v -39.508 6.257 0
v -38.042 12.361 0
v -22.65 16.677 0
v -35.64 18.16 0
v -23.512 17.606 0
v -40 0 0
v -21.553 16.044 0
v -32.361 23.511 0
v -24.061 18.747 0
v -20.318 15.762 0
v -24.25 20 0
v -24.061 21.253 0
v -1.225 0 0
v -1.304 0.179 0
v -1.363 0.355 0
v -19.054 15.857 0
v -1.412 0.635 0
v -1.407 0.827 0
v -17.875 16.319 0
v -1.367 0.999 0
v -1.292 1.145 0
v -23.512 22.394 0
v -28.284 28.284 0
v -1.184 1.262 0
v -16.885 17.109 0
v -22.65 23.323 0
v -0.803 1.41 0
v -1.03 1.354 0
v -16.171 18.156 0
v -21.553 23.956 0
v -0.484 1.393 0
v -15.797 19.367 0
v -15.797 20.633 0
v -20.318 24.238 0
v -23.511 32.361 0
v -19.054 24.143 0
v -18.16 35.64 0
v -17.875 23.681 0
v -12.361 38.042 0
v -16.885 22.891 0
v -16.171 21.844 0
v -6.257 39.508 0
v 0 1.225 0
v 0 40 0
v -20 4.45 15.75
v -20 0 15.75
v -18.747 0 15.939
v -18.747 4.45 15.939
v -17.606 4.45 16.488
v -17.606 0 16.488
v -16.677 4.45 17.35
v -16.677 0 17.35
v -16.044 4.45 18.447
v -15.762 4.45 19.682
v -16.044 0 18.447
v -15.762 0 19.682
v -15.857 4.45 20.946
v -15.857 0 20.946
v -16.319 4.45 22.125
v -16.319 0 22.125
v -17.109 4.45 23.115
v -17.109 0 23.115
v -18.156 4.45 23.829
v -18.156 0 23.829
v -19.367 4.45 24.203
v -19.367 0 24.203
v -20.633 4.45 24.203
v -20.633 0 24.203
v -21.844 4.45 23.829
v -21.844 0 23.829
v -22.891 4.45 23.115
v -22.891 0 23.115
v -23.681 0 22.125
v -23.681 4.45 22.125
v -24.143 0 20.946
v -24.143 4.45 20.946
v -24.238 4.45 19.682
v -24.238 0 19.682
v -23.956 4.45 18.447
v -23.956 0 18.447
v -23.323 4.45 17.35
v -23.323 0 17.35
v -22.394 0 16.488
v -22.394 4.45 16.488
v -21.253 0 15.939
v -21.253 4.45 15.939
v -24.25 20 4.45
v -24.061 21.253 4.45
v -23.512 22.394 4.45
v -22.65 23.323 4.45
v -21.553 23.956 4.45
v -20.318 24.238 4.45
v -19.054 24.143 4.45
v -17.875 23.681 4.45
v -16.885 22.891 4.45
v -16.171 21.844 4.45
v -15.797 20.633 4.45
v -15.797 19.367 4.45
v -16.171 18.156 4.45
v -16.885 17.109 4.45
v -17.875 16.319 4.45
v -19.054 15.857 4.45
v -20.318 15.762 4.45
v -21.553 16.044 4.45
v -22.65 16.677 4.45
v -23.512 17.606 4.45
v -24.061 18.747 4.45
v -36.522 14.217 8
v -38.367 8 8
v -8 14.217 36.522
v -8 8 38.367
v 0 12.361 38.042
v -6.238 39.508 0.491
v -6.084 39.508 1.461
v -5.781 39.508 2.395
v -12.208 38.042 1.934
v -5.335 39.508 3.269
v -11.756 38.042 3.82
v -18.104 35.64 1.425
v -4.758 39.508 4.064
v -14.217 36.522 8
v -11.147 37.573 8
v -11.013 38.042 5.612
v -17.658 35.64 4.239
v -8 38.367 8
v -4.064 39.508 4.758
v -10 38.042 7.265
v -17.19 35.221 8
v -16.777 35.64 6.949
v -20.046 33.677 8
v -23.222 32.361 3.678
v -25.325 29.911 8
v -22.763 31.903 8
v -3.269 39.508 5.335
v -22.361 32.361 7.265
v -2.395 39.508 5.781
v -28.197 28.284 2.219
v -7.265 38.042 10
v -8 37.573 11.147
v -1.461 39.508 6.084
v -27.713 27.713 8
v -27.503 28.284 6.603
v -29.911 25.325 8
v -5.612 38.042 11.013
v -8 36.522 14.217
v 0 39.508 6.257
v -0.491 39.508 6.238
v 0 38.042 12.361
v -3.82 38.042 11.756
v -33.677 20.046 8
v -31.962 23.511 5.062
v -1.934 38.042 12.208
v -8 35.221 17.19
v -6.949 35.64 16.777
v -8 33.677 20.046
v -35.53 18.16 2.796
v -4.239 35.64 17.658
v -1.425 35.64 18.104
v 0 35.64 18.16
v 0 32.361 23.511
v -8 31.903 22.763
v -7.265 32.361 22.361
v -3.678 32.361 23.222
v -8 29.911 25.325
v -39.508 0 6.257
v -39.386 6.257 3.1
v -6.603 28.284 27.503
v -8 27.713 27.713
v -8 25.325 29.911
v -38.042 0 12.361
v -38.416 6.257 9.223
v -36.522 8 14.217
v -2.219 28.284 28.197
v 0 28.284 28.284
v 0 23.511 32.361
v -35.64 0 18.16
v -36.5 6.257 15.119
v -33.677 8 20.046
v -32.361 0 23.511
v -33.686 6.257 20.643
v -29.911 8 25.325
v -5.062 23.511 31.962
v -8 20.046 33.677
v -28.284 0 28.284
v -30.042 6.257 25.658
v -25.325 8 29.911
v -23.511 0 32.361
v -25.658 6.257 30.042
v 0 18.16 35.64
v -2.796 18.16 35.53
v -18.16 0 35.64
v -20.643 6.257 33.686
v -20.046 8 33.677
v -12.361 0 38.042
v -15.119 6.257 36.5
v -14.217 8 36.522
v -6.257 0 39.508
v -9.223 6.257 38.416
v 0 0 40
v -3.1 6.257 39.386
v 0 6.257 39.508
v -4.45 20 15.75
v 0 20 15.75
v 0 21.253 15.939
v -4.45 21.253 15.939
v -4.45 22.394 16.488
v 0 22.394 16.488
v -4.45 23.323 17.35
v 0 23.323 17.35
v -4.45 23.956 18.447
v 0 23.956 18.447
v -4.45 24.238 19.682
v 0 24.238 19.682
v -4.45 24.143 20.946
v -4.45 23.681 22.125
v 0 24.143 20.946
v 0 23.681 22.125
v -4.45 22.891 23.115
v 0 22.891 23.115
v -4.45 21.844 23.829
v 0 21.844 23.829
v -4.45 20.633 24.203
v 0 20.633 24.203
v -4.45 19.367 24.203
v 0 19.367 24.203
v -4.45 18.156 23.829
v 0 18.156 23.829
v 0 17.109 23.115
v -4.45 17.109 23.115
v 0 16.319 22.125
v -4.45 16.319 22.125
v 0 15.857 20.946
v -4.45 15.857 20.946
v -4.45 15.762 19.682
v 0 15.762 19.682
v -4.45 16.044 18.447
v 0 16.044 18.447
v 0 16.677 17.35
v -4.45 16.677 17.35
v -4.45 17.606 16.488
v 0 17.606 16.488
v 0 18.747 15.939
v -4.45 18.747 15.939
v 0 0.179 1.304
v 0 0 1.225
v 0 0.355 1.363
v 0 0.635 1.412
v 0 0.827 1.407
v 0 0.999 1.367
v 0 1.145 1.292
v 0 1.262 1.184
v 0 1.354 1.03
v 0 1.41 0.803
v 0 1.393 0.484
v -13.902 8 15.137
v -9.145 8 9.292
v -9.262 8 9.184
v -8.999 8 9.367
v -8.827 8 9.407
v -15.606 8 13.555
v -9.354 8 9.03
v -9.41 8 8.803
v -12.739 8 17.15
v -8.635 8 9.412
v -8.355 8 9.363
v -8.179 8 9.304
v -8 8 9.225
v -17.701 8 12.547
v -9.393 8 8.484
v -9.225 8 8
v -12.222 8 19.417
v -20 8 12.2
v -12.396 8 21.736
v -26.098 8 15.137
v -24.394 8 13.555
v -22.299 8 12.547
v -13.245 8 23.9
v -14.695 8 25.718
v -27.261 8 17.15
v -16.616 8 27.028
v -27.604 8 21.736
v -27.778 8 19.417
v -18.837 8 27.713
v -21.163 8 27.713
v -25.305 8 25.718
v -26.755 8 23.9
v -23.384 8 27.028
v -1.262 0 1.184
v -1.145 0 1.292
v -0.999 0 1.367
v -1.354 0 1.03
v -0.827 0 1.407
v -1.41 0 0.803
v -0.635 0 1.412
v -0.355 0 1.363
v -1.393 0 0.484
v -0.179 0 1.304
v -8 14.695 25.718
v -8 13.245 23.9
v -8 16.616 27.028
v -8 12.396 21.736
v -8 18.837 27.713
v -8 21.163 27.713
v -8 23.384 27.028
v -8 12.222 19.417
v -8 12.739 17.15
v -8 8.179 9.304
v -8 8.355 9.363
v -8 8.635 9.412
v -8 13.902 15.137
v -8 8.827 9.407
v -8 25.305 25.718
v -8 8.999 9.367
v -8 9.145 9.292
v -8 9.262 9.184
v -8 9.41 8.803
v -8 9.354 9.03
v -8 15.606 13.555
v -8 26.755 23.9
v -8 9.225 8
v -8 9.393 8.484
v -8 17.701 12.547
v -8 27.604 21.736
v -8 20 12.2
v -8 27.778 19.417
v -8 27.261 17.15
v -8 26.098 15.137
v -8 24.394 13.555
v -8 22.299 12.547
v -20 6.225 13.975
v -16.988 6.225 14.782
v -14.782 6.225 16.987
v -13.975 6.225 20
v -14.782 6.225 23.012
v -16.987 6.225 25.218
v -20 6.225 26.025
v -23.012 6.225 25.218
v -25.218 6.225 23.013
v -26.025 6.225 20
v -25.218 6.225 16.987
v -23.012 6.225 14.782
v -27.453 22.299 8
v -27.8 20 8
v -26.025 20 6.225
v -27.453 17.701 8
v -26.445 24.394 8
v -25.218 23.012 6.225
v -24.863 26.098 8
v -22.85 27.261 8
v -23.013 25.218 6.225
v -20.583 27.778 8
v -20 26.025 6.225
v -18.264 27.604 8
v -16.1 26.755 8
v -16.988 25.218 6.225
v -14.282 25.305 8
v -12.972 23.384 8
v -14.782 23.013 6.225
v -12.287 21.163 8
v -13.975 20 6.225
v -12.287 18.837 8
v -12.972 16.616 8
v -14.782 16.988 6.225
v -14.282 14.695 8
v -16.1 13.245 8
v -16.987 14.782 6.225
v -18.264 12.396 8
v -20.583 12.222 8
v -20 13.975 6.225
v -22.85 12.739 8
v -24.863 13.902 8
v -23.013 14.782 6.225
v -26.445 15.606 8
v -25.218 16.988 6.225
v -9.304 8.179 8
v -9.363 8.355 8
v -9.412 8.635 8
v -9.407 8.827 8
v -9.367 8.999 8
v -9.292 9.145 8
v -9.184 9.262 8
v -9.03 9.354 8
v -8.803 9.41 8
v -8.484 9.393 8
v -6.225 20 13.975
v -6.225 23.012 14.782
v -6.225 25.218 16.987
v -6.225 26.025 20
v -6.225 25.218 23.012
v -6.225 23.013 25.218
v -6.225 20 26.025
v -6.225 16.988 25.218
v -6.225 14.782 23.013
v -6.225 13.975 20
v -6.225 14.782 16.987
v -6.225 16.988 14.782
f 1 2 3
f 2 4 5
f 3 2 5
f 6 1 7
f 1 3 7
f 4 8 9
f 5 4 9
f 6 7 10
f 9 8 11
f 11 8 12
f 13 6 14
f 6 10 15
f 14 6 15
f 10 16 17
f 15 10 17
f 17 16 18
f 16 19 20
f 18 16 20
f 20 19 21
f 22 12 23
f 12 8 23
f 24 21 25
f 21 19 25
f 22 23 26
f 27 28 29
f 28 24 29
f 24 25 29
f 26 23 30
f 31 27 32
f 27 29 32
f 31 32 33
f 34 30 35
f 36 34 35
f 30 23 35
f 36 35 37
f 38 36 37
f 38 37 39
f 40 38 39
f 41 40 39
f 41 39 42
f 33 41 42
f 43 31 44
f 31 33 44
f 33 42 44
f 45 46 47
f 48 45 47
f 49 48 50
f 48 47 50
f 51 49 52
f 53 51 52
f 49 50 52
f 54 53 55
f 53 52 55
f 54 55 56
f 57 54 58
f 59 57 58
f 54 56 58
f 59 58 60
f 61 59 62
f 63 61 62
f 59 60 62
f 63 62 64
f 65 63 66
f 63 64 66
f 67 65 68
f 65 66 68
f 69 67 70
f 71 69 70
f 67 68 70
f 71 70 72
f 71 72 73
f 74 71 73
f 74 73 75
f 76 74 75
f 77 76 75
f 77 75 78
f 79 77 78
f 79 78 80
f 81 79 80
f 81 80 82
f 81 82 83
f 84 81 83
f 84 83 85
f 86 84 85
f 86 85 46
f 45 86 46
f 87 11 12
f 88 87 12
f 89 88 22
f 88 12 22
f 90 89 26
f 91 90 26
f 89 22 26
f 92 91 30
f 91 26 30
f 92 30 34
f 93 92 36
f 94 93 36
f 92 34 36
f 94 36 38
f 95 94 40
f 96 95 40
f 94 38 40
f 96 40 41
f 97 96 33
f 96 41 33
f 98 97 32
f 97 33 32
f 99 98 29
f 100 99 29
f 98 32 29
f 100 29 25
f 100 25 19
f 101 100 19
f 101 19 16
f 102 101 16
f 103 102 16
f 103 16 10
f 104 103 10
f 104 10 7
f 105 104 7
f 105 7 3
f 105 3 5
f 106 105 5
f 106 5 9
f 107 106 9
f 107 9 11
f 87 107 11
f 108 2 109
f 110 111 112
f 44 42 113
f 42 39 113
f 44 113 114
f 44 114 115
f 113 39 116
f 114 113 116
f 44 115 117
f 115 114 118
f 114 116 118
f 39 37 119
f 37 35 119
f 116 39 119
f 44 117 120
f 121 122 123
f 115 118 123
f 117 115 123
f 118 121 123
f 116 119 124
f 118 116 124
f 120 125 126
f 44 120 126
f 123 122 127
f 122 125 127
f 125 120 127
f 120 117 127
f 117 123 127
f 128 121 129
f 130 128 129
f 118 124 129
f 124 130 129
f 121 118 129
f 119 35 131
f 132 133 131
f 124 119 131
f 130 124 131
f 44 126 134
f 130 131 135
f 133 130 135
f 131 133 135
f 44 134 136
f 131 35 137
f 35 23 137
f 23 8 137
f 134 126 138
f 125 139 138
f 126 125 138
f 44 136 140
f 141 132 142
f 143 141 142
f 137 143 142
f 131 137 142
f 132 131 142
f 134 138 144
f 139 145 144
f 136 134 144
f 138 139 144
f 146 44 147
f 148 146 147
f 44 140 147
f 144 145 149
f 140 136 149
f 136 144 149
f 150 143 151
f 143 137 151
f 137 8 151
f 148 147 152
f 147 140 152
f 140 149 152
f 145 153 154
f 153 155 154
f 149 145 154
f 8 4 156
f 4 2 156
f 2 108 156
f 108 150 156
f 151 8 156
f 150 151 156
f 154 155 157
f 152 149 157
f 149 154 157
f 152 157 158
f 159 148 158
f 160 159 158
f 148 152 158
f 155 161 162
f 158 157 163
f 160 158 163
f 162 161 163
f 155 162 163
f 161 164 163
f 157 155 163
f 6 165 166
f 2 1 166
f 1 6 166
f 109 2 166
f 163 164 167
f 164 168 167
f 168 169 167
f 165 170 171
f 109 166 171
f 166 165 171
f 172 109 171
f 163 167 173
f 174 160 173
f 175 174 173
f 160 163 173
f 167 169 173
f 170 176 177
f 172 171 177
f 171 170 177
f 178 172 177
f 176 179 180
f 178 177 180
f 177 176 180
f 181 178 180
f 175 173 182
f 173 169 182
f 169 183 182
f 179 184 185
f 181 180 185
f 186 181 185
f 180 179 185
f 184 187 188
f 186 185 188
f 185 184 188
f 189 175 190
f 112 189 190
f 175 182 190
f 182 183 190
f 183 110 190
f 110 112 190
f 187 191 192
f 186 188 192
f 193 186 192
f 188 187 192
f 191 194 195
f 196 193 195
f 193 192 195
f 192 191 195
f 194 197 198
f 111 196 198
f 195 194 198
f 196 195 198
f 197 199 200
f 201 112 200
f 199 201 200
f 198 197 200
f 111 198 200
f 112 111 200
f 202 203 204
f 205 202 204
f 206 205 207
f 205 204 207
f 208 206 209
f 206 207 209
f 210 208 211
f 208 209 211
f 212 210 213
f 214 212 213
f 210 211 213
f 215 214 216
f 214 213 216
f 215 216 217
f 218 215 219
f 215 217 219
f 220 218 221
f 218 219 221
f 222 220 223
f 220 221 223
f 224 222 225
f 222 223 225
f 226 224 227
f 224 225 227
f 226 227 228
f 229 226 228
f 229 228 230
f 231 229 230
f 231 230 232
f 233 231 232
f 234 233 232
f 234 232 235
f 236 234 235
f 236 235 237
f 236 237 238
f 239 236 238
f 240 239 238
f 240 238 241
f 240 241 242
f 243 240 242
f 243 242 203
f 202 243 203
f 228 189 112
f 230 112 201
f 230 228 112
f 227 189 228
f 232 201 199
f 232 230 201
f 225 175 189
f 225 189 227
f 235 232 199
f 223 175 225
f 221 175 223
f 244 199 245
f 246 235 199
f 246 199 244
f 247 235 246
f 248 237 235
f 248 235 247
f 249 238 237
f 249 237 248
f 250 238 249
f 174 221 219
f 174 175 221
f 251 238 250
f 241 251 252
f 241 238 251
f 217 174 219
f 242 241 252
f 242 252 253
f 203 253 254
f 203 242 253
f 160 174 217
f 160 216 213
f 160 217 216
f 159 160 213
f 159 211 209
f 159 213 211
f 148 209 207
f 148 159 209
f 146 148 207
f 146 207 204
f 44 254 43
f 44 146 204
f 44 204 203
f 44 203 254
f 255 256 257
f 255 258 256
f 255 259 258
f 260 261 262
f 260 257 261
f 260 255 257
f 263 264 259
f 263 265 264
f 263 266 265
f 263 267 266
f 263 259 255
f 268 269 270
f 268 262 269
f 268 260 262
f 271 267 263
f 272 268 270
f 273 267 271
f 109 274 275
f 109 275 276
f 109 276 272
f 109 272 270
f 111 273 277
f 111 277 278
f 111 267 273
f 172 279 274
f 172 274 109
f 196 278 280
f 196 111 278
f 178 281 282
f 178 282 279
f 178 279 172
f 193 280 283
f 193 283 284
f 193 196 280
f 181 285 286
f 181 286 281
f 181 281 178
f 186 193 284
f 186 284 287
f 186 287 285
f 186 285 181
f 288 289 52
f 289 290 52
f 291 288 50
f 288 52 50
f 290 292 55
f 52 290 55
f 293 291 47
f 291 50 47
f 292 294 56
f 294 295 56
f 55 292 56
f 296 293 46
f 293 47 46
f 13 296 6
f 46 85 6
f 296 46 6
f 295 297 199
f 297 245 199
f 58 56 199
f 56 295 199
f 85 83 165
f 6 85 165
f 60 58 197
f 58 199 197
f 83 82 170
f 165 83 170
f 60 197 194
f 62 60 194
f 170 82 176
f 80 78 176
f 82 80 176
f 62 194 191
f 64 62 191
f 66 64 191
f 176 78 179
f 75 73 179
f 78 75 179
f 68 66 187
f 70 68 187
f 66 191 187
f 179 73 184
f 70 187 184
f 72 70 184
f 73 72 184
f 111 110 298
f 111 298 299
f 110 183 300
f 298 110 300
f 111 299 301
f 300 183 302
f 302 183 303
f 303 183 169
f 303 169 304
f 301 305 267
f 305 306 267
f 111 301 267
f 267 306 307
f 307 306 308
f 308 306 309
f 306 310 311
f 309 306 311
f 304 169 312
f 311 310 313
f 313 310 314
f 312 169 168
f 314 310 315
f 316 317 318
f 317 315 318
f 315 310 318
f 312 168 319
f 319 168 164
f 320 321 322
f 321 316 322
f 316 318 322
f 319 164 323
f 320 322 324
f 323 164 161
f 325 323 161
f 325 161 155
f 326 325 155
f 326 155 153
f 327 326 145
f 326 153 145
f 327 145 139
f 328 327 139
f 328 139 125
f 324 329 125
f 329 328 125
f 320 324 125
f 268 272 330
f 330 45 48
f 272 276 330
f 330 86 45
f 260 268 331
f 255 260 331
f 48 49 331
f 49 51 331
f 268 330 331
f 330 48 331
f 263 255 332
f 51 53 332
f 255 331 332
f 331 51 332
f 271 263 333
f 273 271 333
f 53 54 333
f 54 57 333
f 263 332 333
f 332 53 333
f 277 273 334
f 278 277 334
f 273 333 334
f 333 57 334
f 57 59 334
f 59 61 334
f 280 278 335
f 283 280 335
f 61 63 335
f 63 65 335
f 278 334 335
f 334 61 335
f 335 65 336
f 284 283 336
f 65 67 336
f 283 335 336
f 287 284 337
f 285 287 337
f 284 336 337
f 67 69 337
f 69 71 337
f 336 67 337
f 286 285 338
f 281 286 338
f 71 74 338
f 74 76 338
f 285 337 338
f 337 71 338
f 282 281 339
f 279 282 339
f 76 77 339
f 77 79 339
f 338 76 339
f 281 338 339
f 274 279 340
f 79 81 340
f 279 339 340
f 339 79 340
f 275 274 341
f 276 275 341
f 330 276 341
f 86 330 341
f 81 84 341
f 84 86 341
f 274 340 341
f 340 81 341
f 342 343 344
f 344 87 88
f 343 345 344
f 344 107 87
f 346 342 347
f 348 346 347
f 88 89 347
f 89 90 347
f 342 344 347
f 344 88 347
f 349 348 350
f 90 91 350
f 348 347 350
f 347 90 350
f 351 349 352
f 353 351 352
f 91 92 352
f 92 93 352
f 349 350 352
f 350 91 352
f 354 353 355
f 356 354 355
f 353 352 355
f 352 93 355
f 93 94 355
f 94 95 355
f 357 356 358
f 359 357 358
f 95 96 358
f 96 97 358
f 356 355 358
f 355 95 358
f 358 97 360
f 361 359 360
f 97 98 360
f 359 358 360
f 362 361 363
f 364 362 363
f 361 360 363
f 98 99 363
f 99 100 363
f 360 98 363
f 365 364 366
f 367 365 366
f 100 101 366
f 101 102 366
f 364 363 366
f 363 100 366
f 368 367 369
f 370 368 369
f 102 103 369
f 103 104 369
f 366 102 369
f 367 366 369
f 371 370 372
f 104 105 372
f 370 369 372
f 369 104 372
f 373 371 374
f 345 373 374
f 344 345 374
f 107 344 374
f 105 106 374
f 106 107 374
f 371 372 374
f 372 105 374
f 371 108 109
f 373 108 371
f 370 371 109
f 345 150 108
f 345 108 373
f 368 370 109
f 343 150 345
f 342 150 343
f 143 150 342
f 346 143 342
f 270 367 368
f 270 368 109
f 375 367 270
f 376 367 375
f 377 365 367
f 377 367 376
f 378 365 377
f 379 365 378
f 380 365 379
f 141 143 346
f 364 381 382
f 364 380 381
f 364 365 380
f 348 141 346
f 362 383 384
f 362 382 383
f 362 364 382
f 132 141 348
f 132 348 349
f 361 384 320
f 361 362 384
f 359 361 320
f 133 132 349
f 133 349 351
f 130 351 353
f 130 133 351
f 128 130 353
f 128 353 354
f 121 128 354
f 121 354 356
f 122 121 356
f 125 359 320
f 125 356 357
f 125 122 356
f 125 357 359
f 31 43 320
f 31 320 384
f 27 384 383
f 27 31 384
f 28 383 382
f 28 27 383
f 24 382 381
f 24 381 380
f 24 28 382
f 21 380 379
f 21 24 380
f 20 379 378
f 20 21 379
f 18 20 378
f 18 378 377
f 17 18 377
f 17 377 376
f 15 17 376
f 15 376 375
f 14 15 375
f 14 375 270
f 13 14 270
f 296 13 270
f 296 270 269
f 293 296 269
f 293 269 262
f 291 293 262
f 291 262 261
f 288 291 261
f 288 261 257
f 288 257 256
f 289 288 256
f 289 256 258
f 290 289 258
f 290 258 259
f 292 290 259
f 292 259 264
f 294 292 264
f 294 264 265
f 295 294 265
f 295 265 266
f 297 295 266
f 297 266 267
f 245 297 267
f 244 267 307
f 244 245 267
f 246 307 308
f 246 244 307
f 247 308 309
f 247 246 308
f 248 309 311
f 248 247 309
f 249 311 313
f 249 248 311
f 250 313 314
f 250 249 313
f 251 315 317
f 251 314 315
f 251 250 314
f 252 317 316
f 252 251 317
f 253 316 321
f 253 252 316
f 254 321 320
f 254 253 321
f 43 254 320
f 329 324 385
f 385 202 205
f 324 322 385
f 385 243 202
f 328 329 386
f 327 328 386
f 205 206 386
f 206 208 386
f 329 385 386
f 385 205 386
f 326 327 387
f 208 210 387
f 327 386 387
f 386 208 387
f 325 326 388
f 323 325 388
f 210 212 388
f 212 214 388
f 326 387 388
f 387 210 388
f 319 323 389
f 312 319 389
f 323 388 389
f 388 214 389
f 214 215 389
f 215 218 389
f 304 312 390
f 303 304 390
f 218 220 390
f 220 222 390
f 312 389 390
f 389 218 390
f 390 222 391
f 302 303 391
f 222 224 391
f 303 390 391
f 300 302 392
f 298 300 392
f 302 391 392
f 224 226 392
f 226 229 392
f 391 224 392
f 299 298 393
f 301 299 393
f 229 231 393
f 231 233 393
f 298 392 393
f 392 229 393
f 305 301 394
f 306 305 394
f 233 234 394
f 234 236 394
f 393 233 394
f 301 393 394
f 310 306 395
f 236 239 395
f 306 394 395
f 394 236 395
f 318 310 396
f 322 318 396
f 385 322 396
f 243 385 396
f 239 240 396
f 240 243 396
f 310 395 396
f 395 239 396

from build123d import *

# Parameters (mm, degrees)
REVOLVE_2_ANGLE     = 90
SHELL_1_T           = -8
SKETCH_3_R          = 4.25
CUT_EXTRUDE_1_DEPTH = 70.282032303
SKETCH_4_R          = 4.25
CUT_EXTRUDE_2_DEPTH = 70.282032303
SKETCH_5_R          = 4.25
CUT_EXTRUDE_3_DEPTH = 70.282032303
CHAMFER_1_SIZE      = 3.55
CHAMFER_2_SIZE      = 3.55
CHAMFER_3_SIZE      = 3.55


with BuildPart() as part:
    # 草图2 → 旋转2 (revolve)
    with BuildSketch(Plane.XY):
        with BuildLine():
            Line((0, 0), (0, 40))
            ThreePointArc((0, 40), (-28.284271247, 28.284271247), (-40, 0))
            Line((-40, 0), (0, 0))
        make_face()
    revolve(axis=Axis((0, 0, 0), (0, 1, 0)), revolution_arc=REVOLVE_2_ANGLE)

    # 抽壳1
    shell_1_openings = [part.faces().sort_by_distance(p)[0] for p in [
        (-20, 28.284271247, 20),
    ]]
    offset(amount=SHELL_1_T, openings=shell_1_openings, kind=Kind.INTERSECTION)

    # 草图3 → 切除-拉伸1 (cut, through all)
    with BuildSketch(Plane(origin=(0, 0, 0), x_dir=(0, 0, -1), z_dir=(1, 0, 0))):
        with Locations((-20, 20)):
            Circle(SKETCH_3_R)
    extrude(amount=-CUT_EXTRUDE_1_DEPTH, mode=Mode.SUBTRACT)

    # 草图4 → 切除-拉伸2 (cut, through all)
    with BuildSketch(Plane(origin=(0, 0, 0), x_dir=(-1, 0, 0), z_dir=(0, 0, -1))):
        with Locations((20, 20)):
            Circle(SKETCH_4_R)
    extrude(amount=-CUT_EXTRUDE_2_DEPTH, mode=Mode.SUBTRACT)

    # 草图5 → 切除-拉伸3 (cut, through all)
    with BuildSketch(Plane.XZ):
        with Locations(Location((-20, 20, 0), (0, 0, 270))):
            Circle(SKETCH_5_R)
    extrude(amount=-CUT_EXTRUDE_3_DEPTH, mode=Mode.SUBTRACT)

    # 倒角1
    chamfer_1_edges = [part.edges().sort_by_distance(p)[0] for p in [
        (-8, 20, 24.25),
    ]]
    chamfer(chamfer_1_edges, length=CHAMFER_1_SIZE)

    # 倒角2
    chamfer_2_edges = [part.edges().sort_by_distance(p)[0] for p in [
        (-15.75, 20, 8),
    ]]
    chamfer(chamfer_2_edges, length=CHAMFER_2_SIZE)

    # 倒角3
    chamfer_3_edges = [part.edges().sort_by_distance(p)[0] for p in [
        (-20, 8, 24.25),
    ]]
    chamfer(chamfer_3_edges, length=CHAMFER_3_SIZE)

    # 草图9 → 切除-旋转2 (revolve, cut)
    with BuildSketch(Plane(origin=(0, 0, 0), x_dir=(-0.7071067811865464, 0, 0.7071067811865488), z_dir=(-0.7071067811865488, 0, -0.7071067811865464)), mode=Mode.PRIVATE) as cut_revolve_2_sk:
        Polygon((-5.259009462, -3.718681253), (16.625182172, 11.755779052), (17.202532441, 10.939282471), (-4.592338975, -4.472018902), align=None)
    revolve(cut_revolve_2_sk.sketch.rotate(Axis((3.718681253, -3.718681253, -3.718681253), (-0.5773502691896244, 0.5773502691896266, 0.5773502691896265)), 180), axis=Axis((3.718681253, -3.718681253, -3.718681253), (-0.5773502691896244, 0.5773502691896266, 0.5773502691896265)), mode=Mode.SUBTRACT)


solid = part.part
